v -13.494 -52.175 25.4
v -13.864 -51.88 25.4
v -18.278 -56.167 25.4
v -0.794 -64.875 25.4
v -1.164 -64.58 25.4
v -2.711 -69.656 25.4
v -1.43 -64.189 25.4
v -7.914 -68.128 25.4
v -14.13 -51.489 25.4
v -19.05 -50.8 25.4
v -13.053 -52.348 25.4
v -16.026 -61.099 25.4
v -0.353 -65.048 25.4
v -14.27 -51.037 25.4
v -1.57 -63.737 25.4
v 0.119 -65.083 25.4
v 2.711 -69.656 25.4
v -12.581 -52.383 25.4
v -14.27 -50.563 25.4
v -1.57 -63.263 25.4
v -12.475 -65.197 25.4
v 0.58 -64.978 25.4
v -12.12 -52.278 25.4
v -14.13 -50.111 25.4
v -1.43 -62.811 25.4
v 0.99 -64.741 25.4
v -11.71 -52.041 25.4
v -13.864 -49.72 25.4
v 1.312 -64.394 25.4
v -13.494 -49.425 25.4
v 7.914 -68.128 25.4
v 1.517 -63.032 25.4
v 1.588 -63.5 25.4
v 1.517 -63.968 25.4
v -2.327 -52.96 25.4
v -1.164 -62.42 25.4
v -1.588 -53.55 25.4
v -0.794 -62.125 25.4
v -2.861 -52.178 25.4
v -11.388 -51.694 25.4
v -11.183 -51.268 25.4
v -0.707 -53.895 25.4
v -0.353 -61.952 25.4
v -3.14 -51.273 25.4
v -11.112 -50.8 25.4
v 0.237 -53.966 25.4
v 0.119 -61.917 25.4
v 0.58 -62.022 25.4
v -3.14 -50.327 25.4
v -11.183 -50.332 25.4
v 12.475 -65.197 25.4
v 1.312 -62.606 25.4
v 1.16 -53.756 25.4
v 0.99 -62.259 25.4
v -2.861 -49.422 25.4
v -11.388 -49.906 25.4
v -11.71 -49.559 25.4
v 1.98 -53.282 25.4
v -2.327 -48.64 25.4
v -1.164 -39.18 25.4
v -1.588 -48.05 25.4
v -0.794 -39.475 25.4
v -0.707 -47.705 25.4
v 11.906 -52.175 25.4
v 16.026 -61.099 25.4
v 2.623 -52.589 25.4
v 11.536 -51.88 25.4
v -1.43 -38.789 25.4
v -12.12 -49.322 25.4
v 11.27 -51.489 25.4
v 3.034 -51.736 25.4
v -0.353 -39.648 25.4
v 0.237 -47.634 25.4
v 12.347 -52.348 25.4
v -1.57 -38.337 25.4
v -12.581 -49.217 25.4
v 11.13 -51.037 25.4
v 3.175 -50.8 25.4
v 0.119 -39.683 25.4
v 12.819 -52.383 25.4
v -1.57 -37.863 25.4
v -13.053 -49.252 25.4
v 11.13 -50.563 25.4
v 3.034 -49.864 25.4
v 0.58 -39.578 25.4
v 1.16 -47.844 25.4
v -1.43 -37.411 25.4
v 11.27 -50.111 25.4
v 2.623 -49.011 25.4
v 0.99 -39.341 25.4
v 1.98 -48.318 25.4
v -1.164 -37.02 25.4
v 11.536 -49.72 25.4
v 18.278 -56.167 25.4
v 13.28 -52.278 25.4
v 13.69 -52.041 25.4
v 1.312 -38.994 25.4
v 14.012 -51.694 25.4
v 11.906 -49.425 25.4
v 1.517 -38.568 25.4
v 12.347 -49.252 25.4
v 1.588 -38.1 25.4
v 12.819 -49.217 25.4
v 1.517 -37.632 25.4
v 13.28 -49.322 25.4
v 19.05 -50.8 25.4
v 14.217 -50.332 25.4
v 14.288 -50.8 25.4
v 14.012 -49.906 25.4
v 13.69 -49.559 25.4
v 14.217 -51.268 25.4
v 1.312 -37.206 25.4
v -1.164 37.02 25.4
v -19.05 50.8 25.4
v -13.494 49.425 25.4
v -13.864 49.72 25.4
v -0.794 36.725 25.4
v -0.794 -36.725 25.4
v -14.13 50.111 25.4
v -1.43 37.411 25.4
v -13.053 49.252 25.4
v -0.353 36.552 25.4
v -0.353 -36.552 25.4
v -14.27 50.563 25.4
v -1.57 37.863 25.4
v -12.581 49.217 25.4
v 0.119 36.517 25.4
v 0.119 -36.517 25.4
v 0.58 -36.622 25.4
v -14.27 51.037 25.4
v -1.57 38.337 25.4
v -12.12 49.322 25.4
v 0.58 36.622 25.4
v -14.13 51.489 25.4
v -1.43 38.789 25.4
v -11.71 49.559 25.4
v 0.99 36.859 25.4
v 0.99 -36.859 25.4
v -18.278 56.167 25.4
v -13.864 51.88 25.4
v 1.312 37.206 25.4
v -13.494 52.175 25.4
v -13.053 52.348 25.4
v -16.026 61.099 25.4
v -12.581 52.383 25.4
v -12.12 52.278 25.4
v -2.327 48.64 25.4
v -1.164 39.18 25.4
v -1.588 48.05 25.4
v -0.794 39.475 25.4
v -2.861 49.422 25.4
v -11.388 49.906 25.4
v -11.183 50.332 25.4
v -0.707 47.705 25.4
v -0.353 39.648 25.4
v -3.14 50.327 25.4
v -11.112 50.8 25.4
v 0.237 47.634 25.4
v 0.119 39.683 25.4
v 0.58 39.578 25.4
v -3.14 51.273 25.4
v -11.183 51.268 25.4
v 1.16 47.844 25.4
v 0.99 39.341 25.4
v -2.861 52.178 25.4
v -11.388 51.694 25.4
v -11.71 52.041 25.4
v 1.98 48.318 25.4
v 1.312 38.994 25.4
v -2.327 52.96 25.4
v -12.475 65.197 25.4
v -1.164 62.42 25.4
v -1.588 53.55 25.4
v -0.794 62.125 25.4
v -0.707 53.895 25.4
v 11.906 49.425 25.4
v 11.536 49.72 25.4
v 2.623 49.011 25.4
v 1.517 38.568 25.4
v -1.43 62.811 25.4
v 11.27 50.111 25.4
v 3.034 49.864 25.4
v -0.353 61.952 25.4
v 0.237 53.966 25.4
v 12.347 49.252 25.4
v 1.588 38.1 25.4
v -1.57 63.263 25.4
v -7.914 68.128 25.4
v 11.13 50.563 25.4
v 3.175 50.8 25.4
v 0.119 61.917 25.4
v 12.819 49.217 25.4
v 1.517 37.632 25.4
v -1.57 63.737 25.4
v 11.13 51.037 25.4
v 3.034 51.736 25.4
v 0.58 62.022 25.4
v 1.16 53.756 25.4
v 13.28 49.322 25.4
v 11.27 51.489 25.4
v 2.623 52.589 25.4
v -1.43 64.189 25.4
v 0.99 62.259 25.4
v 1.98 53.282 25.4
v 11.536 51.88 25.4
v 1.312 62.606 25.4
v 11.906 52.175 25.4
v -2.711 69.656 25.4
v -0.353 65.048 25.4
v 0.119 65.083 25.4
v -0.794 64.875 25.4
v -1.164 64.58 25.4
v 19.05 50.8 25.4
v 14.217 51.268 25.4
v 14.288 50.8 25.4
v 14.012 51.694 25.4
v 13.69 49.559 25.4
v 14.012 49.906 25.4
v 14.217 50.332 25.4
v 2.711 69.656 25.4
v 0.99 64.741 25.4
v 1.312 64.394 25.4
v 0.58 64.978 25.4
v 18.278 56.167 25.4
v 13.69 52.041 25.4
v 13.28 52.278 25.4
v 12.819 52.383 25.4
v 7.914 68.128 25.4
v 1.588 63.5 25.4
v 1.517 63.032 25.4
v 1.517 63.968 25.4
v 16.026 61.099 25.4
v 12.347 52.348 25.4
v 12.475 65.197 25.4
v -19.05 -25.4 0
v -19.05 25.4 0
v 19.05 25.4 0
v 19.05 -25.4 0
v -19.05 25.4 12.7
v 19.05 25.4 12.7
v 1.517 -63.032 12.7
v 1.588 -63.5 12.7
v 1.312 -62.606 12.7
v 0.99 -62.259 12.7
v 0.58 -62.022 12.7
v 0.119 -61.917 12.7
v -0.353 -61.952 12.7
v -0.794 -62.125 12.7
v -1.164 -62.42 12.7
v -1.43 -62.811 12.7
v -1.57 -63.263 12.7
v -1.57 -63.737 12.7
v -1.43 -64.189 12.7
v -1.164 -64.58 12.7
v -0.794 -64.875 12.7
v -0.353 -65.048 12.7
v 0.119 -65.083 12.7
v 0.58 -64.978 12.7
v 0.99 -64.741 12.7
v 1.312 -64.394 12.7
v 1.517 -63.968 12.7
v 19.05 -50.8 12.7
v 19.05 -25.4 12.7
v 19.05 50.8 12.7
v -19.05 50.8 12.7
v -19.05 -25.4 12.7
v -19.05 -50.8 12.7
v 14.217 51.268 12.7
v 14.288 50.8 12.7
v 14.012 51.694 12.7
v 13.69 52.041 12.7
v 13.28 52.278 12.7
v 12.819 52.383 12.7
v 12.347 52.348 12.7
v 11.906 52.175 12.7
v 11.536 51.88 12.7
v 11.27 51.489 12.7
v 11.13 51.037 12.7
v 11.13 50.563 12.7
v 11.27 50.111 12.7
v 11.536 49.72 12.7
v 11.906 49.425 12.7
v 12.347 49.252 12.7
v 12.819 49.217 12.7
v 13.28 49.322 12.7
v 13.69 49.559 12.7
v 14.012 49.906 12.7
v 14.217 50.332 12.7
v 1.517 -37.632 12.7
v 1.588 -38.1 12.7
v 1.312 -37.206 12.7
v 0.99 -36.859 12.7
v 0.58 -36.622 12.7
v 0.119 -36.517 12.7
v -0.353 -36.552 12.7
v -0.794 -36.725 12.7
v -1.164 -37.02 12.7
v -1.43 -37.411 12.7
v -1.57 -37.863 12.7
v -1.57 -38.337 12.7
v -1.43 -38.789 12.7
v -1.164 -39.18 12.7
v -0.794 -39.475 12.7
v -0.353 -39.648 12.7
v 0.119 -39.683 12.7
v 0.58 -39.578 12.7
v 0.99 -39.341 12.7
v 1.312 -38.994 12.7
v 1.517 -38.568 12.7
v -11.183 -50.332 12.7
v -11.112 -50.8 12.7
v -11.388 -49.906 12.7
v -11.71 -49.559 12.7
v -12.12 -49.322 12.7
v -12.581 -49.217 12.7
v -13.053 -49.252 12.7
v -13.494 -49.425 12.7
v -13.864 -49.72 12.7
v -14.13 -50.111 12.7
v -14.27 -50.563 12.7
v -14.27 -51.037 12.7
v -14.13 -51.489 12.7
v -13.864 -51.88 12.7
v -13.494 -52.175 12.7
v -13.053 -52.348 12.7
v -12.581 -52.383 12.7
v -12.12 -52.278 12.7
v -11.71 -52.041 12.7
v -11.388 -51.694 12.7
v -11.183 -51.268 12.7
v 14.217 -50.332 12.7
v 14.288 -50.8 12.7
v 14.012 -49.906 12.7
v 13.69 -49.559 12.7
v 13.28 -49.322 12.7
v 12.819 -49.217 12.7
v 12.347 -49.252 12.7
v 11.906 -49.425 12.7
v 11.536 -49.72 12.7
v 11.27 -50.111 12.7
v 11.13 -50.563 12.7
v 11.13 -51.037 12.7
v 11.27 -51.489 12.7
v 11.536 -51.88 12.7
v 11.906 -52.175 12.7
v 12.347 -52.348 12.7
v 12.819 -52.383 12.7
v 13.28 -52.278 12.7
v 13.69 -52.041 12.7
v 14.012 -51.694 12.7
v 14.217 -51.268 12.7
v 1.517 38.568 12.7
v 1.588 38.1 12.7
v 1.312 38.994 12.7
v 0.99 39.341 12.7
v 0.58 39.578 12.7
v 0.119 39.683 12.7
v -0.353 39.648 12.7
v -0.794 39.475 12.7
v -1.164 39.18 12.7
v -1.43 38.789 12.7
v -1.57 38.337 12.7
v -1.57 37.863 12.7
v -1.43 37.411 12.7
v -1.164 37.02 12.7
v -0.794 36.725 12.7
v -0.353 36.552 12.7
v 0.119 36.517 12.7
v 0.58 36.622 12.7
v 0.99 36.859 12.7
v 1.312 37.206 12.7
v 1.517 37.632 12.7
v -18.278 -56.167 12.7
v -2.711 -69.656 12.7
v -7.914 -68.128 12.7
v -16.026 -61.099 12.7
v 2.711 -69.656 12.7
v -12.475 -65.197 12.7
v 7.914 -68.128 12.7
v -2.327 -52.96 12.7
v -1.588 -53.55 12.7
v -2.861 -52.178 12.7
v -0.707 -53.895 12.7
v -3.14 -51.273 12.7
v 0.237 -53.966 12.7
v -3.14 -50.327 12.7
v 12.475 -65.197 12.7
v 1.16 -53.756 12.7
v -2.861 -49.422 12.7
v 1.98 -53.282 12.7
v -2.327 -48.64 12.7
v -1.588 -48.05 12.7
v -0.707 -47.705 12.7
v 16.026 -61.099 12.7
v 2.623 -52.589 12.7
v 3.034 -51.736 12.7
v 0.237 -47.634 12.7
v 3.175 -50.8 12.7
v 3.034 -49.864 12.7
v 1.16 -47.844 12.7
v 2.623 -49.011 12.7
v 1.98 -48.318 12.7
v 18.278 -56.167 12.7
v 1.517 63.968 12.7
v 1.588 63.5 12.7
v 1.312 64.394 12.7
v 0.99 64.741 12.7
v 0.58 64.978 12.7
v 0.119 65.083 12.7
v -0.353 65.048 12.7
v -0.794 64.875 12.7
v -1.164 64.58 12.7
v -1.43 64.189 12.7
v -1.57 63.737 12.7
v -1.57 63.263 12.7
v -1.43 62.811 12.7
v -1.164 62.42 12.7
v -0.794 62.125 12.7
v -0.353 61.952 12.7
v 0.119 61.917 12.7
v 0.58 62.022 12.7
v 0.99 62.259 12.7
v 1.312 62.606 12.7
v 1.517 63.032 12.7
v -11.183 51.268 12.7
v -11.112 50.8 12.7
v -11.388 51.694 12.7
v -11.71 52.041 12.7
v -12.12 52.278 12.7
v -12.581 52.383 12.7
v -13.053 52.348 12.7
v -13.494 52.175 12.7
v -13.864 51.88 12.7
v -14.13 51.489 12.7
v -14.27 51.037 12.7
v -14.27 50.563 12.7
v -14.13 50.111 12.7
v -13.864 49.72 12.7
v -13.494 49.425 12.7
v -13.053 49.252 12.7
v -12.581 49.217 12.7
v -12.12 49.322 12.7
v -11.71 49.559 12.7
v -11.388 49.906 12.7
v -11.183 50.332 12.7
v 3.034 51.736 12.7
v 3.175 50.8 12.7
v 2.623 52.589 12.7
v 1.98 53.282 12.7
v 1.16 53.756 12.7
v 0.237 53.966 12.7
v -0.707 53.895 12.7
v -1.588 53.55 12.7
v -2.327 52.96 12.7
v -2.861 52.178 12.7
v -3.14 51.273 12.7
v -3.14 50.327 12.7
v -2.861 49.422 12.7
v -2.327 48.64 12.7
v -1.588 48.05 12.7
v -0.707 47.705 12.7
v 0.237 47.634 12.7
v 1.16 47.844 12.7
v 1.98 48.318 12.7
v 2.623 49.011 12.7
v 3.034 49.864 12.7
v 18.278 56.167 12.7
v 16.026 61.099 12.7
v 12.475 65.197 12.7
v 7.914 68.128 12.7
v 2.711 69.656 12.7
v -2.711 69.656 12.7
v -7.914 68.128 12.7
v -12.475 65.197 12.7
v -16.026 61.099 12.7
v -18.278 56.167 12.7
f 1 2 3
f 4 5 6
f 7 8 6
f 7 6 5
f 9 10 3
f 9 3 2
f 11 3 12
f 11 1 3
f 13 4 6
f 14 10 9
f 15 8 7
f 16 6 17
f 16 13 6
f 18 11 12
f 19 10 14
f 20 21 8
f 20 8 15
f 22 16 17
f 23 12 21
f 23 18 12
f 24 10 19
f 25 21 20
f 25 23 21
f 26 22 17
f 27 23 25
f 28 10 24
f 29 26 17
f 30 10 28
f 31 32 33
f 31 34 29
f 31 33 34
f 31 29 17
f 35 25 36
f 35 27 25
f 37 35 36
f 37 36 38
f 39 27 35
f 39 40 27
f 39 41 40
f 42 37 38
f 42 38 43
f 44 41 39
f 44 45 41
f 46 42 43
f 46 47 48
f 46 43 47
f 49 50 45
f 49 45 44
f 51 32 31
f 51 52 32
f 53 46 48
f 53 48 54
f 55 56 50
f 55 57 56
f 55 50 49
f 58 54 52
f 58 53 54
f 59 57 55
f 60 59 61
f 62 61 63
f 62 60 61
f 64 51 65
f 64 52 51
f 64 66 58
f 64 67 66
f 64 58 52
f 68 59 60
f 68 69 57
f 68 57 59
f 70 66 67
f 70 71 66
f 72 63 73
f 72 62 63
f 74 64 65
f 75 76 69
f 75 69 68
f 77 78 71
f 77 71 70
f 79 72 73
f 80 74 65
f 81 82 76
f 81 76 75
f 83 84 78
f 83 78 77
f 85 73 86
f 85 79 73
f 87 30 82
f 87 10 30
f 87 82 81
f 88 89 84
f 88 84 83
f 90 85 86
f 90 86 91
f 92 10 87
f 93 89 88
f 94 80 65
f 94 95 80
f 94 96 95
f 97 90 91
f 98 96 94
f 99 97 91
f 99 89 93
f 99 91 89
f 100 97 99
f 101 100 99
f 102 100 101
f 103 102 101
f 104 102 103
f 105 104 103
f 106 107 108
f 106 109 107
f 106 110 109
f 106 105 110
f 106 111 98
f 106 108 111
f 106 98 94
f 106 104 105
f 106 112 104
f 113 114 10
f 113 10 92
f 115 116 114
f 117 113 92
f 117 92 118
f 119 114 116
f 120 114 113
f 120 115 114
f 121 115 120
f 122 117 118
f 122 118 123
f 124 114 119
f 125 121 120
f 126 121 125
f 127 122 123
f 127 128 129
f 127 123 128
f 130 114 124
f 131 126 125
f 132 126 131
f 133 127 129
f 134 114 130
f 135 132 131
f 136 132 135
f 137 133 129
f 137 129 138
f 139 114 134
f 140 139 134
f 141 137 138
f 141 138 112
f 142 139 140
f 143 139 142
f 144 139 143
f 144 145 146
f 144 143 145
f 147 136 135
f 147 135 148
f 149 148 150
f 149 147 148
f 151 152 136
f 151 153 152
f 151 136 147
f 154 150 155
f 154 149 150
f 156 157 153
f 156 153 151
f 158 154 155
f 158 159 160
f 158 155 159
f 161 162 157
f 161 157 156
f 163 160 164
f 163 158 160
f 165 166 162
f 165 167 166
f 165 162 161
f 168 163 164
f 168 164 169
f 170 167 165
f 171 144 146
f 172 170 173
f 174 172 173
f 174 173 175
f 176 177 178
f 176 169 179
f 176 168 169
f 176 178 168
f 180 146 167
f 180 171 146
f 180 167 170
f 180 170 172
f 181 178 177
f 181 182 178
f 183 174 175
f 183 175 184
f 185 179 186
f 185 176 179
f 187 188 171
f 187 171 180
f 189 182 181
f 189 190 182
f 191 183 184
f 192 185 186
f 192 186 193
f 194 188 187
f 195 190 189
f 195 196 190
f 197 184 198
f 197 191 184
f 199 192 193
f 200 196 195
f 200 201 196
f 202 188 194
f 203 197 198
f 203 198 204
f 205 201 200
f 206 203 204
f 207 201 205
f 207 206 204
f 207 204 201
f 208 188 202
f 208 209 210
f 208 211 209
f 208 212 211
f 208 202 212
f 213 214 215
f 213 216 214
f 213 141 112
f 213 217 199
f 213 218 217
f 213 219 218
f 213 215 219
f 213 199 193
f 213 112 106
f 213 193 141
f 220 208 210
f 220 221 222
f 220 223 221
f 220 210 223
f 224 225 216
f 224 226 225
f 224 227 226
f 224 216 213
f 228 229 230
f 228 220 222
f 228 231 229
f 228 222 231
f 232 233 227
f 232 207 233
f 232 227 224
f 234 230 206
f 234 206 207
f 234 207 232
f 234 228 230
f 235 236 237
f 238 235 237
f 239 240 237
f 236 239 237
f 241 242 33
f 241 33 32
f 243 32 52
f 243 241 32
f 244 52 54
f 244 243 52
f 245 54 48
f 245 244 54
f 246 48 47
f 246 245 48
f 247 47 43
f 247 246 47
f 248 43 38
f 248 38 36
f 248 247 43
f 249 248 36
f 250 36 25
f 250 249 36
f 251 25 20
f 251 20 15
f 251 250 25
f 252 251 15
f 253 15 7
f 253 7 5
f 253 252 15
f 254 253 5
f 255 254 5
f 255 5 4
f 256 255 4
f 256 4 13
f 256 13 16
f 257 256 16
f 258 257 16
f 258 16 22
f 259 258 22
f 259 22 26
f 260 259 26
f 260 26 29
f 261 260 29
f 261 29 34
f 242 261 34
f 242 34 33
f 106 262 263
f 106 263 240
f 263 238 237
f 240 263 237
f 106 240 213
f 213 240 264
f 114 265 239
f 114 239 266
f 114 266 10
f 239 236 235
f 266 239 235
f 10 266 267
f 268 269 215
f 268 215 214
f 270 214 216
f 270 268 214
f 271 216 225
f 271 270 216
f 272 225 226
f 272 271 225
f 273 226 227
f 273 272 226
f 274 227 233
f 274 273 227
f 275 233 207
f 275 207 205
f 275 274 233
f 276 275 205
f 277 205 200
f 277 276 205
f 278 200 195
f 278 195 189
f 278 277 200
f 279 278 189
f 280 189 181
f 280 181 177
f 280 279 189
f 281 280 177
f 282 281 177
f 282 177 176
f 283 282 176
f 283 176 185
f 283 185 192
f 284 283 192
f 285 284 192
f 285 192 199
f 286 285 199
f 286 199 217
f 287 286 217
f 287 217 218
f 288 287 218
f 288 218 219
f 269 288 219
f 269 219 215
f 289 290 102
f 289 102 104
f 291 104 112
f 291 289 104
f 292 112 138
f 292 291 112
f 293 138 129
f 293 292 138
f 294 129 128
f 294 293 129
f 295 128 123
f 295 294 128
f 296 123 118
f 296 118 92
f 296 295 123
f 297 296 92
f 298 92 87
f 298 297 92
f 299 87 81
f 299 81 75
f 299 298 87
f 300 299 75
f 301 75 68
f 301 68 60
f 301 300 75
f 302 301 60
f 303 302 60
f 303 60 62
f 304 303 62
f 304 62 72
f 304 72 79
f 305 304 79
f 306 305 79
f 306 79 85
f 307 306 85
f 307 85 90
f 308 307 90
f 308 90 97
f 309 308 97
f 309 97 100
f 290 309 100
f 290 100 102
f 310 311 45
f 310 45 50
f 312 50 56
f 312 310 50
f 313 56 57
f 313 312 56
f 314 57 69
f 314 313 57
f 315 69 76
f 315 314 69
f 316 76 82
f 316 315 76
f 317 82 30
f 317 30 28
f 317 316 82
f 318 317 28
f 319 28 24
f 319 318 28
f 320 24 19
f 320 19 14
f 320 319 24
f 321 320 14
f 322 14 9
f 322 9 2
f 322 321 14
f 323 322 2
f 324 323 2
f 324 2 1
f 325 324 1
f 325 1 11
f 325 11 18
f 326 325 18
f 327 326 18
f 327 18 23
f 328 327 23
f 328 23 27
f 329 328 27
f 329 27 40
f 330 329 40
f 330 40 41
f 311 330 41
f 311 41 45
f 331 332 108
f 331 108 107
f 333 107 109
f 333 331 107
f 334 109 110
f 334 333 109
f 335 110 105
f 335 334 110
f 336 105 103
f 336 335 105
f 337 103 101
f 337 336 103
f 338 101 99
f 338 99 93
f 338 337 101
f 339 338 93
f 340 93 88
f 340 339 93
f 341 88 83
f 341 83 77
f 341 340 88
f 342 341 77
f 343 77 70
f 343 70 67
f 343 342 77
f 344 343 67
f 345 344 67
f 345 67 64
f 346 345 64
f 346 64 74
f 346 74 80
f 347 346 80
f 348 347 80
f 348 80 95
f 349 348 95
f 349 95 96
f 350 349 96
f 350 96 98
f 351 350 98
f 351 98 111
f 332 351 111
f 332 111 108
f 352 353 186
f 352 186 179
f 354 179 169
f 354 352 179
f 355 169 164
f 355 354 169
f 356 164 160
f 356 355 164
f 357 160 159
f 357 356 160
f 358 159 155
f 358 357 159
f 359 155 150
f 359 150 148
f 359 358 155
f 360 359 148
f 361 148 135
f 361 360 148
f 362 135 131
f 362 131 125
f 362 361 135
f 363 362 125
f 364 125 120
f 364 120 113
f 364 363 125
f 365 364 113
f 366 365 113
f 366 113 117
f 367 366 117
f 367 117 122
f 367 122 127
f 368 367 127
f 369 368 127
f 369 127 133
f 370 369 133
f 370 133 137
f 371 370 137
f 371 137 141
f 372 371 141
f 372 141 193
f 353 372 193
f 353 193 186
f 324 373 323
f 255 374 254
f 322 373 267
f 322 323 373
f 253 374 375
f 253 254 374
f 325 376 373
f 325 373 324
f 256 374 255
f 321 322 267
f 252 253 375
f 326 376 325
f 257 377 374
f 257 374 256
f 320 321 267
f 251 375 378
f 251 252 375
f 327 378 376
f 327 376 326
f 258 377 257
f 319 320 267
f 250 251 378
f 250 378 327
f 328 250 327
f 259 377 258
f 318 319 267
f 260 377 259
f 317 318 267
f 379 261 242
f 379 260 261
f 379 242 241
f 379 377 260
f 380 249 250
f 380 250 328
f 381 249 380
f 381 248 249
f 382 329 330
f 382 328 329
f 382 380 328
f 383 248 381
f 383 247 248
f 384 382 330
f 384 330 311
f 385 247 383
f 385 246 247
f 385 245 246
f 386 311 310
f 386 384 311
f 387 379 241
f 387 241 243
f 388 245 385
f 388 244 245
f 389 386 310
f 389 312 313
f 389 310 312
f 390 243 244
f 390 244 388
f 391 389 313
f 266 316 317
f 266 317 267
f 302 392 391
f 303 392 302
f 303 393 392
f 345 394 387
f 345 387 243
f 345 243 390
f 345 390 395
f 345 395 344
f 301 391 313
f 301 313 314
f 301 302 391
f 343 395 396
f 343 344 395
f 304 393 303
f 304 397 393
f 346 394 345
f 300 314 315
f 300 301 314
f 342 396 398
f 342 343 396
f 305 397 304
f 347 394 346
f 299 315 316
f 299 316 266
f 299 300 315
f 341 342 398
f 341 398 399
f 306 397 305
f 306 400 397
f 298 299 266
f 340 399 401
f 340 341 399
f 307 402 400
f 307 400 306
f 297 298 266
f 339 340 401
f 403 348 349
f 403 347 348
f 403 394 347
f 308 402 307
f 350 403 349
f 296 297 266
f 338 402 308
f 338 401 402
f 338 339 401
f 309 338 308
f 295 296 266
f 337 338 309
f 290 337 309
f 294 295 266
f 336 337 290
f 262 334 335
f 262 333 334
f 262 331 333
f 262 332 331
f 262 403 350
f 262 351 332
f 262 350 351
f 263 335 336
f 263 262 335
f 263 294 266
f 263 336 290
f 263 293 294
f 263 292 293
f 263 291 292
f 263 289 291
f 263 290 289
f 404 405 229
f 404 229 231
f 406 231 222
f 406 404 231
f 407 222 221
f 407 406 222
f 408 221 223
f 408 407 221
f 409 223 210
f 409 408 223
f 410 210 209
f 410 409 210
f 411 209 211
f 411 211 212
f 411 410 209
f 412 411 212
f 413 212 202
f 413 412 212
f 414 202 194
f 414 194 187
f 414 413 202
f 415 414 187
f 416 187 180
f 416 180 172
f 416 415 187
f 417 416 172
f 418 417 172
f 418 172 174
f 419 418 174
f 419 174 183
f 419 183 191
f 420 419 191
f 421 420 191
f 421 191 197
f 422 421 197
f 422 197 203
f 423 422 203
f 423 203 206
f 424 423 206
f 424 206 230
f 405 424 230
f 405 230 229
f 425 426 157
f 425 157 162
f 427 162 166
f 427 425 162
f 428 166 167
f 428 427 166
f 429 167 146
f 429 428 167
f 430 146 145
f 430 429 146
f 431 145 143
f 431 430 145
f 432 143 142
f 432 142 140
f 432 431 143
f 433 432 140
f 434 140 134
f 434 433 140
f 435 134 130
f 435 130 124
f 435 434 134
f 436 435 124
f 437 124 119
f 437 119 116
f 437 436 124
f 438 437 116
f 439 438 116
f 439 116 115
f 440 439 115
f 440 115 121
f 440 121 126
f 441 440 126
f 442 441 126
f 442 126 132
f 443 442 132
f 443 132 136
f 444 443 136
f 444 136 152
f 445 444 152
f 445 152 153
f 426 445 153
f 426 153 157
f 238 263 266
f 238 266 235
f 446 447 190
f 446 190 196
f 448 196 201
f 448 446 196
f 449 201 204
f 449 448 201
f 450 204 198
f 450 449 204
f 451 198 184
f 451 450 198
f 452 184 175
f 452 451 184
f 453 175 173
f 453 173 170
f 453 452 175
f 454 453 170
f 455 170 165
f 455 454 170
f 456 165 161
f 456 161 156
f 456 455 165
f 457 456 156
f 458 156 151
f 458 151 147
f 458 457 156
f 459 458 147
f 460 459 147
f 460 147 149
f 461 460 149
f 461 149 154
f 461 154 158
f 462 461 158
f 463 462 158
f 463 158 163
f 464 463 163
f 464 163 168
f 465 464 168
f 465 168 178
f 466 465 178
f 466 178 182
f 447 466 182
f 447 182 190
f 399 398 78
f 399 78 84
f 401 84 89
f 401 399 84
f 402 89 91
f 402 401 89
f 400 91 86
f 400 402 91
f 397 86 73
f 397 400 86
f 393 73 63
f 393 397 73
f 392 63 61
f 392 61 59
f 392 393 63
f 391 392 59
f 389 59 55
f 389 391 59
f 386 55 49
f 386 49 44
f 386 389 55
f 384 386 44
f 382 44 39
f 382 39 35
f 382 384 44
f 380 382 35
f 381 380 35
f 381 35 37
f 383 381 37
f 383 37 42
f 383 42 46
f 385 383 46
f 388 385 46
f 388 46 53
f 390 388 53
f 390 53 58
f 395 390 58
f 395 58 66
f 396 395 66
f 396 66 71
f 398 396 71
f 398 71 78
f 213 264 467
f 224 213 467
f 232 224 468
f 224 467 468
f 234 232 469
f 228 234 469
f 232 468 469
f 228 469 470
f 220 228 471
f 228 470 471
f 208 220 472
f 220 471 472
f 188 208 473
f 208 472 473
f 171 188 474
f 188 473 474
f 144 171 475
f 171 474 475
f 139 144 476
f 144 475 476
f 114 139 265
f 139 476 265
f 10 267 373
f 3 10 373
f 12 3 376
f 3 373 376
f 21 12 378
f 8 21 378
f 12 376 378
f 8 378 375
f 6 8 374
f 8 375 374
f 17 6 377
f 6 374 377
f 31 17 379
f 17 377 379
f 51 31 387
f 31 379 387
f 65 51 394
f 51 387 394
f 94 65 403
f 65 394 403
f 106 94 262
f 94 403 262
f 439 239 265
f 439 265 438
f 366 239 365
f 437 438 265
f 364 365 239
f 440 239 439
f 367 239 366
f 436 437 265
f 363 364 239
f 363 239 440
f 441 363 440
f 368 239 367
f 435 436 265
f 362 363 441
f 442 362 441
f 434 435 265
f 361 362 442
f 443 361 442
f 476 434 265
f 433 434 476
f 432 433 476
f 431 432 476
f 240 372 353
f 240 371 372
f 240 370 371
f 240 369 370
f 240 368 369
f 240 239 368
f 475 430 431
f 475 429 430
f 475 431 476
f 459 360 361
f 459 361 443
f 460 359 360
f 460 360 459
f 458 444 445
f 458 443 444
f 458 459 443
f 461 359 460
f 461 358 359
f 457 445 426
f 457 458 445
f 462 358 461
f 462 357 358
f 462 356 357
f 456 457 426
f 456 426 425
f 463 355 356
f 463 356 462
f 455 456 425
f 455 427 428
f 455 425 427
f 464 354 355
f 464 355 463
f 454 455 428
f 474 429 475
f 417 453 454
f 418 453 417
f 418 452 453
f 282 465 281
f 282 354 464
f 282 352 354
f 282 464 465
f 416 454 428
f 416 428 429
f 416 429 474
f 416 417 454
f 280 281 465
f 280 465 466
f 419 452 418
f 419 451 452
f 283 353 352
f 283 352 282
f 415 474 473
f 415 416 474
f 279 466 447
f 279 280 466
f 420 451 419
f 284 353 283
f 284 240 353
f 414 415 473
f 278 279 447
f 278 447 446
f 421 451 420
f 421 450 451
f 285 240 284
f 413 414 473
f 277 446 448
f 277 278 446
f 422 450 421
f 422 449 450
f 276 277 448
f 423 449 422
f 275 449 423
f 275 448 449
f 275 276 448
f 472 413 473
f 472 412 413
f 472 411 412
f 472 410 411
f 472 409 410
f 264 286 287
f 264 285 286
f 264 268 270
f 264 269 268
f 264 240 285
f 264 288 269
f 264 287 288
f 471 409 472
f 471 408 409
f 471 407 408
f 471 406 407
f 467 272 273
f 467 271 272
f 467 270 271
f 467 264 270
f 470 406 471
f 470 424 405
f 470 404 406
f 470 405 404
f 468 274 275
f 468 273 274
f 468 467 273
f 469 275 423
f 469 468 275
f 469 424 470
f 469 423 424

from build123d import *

# Parameters (mm, degrees)
SKETCH1_R           = 3.175
SKETCH1_R_2         = 1.5875
BOSS_EXTRUDE1_DEPTH = 25.4
CUT_EXTRUDE1_REACH  = 40.1
SKETCH2_W           = 12.7
SKETCH2_H           = 44.45


with BuildPart() as part:
    # Sketch1 → Boss-Extrude1 (new body)
    with BuildSketch(Plane.XY):
        with BuildLine():
            Line((-19.05, 50.8), (-19.05, -50.8))
            ThreePointArc((-19.05, -50.8), (0, -69.85), (19.05, -50.8))
            Line((19.05, -50.8), (19.05, 50.8))
            ThreePointArc((19.05, 50.8), (0, 69.85), (-19.05, 50.8))
        make_face()
        with Locations((0, 50.8)):
            Circle(SKETCH1_R, mode=Mode.SUBTRACT)
        with Locations((0, -50.8)):
            Circle(SKETCH1_R, mode=Mode.SUBTRACT)
        with Locations((0, 63.5)):
            Circle(SKETCH1_R_2, mode=Mode.SUBTRACT)
        with Locations((-12.7, 50.8)):
            Circle(SKETCH1_R_2, mode=Mode.SUBTRACT)
        with Locations((0, 38.1)):
            Circle(SKETCH1_R_2, mode=Mode.SUBTRACT)
        with Locations((12.7, 50.8)):
            Circle(SKETCH1_R_2, mode=Mode.SUBTRACT)
        with Locations((-12.7, -50.8)):
            Circle(SKETCH1_R_2, mode=Mode.SUBTRACT)
        with Locations((0, -38.1)):
            Circle(SKETCH1_R_2, mode=Mode.SUBTRACT)
        with Locations((12.7, -50.8)):
            Circle(SKETCH1_R_2, mode=Mode.SUBTRACT)
        with Locations((0, -63.5)):
            Circle(SKETCH1_R_2, mode=Mode.SUBTRACT)
    extrude(amount=BOSS_EXTRUDE1_DEPTH)

    # Sketch2 → Cut-Extrude1 (cut, up to next)
    with BuildSketch(Plane(origin=(19.05, 0, 0), x_dir=(0, 0, -1), z_dir=(1, 0, 0)), mode=Mode.PRIVATE) as cut_extrude1_sk1:
        with Locations((-6.35, 47.625)):
            Rectangle(SKETCH2_W, SKETCH2_H)
    cut_extrude1_tool1 = extrude(cut_extrude1_sk1.sketch, amount=-CUT_EXTRUDE1_REACH, mode=Mode.PRIVATE) & part.part
    add(cut_extrude1_tool1.solids().sort_by_distance((19.05, 47.625, 6.35))[0], mode=Mode.SUBTRACT)
    # Sketch2 → Cut-Extrude1 (cut, up to next)
    with BuildSketch(Plane(origin=(19.05, 0, 0), x_dir=(0, 0, -1), z_dir=(1, 0, 0)), mode=Mode.PRIVATE) as cut_extrude1_sk2:
        with Locations((-6.35, -47.625)):
            Rectangle(SKETCH2_W, SKETCH2_H)
    cut_extrude1_tool2 = extrude(cut_extrude1_sk2.sketch, amount=-CUT_EXTRUDE1_REACH, mode=Mode.PRIVATE) & part.part
    add(cut_extrude1_tool2.solids().sort_by_distance((19.05, -47.625, 6.35))[0], mode=Mode.SUBTRACT)


solid = part.part
